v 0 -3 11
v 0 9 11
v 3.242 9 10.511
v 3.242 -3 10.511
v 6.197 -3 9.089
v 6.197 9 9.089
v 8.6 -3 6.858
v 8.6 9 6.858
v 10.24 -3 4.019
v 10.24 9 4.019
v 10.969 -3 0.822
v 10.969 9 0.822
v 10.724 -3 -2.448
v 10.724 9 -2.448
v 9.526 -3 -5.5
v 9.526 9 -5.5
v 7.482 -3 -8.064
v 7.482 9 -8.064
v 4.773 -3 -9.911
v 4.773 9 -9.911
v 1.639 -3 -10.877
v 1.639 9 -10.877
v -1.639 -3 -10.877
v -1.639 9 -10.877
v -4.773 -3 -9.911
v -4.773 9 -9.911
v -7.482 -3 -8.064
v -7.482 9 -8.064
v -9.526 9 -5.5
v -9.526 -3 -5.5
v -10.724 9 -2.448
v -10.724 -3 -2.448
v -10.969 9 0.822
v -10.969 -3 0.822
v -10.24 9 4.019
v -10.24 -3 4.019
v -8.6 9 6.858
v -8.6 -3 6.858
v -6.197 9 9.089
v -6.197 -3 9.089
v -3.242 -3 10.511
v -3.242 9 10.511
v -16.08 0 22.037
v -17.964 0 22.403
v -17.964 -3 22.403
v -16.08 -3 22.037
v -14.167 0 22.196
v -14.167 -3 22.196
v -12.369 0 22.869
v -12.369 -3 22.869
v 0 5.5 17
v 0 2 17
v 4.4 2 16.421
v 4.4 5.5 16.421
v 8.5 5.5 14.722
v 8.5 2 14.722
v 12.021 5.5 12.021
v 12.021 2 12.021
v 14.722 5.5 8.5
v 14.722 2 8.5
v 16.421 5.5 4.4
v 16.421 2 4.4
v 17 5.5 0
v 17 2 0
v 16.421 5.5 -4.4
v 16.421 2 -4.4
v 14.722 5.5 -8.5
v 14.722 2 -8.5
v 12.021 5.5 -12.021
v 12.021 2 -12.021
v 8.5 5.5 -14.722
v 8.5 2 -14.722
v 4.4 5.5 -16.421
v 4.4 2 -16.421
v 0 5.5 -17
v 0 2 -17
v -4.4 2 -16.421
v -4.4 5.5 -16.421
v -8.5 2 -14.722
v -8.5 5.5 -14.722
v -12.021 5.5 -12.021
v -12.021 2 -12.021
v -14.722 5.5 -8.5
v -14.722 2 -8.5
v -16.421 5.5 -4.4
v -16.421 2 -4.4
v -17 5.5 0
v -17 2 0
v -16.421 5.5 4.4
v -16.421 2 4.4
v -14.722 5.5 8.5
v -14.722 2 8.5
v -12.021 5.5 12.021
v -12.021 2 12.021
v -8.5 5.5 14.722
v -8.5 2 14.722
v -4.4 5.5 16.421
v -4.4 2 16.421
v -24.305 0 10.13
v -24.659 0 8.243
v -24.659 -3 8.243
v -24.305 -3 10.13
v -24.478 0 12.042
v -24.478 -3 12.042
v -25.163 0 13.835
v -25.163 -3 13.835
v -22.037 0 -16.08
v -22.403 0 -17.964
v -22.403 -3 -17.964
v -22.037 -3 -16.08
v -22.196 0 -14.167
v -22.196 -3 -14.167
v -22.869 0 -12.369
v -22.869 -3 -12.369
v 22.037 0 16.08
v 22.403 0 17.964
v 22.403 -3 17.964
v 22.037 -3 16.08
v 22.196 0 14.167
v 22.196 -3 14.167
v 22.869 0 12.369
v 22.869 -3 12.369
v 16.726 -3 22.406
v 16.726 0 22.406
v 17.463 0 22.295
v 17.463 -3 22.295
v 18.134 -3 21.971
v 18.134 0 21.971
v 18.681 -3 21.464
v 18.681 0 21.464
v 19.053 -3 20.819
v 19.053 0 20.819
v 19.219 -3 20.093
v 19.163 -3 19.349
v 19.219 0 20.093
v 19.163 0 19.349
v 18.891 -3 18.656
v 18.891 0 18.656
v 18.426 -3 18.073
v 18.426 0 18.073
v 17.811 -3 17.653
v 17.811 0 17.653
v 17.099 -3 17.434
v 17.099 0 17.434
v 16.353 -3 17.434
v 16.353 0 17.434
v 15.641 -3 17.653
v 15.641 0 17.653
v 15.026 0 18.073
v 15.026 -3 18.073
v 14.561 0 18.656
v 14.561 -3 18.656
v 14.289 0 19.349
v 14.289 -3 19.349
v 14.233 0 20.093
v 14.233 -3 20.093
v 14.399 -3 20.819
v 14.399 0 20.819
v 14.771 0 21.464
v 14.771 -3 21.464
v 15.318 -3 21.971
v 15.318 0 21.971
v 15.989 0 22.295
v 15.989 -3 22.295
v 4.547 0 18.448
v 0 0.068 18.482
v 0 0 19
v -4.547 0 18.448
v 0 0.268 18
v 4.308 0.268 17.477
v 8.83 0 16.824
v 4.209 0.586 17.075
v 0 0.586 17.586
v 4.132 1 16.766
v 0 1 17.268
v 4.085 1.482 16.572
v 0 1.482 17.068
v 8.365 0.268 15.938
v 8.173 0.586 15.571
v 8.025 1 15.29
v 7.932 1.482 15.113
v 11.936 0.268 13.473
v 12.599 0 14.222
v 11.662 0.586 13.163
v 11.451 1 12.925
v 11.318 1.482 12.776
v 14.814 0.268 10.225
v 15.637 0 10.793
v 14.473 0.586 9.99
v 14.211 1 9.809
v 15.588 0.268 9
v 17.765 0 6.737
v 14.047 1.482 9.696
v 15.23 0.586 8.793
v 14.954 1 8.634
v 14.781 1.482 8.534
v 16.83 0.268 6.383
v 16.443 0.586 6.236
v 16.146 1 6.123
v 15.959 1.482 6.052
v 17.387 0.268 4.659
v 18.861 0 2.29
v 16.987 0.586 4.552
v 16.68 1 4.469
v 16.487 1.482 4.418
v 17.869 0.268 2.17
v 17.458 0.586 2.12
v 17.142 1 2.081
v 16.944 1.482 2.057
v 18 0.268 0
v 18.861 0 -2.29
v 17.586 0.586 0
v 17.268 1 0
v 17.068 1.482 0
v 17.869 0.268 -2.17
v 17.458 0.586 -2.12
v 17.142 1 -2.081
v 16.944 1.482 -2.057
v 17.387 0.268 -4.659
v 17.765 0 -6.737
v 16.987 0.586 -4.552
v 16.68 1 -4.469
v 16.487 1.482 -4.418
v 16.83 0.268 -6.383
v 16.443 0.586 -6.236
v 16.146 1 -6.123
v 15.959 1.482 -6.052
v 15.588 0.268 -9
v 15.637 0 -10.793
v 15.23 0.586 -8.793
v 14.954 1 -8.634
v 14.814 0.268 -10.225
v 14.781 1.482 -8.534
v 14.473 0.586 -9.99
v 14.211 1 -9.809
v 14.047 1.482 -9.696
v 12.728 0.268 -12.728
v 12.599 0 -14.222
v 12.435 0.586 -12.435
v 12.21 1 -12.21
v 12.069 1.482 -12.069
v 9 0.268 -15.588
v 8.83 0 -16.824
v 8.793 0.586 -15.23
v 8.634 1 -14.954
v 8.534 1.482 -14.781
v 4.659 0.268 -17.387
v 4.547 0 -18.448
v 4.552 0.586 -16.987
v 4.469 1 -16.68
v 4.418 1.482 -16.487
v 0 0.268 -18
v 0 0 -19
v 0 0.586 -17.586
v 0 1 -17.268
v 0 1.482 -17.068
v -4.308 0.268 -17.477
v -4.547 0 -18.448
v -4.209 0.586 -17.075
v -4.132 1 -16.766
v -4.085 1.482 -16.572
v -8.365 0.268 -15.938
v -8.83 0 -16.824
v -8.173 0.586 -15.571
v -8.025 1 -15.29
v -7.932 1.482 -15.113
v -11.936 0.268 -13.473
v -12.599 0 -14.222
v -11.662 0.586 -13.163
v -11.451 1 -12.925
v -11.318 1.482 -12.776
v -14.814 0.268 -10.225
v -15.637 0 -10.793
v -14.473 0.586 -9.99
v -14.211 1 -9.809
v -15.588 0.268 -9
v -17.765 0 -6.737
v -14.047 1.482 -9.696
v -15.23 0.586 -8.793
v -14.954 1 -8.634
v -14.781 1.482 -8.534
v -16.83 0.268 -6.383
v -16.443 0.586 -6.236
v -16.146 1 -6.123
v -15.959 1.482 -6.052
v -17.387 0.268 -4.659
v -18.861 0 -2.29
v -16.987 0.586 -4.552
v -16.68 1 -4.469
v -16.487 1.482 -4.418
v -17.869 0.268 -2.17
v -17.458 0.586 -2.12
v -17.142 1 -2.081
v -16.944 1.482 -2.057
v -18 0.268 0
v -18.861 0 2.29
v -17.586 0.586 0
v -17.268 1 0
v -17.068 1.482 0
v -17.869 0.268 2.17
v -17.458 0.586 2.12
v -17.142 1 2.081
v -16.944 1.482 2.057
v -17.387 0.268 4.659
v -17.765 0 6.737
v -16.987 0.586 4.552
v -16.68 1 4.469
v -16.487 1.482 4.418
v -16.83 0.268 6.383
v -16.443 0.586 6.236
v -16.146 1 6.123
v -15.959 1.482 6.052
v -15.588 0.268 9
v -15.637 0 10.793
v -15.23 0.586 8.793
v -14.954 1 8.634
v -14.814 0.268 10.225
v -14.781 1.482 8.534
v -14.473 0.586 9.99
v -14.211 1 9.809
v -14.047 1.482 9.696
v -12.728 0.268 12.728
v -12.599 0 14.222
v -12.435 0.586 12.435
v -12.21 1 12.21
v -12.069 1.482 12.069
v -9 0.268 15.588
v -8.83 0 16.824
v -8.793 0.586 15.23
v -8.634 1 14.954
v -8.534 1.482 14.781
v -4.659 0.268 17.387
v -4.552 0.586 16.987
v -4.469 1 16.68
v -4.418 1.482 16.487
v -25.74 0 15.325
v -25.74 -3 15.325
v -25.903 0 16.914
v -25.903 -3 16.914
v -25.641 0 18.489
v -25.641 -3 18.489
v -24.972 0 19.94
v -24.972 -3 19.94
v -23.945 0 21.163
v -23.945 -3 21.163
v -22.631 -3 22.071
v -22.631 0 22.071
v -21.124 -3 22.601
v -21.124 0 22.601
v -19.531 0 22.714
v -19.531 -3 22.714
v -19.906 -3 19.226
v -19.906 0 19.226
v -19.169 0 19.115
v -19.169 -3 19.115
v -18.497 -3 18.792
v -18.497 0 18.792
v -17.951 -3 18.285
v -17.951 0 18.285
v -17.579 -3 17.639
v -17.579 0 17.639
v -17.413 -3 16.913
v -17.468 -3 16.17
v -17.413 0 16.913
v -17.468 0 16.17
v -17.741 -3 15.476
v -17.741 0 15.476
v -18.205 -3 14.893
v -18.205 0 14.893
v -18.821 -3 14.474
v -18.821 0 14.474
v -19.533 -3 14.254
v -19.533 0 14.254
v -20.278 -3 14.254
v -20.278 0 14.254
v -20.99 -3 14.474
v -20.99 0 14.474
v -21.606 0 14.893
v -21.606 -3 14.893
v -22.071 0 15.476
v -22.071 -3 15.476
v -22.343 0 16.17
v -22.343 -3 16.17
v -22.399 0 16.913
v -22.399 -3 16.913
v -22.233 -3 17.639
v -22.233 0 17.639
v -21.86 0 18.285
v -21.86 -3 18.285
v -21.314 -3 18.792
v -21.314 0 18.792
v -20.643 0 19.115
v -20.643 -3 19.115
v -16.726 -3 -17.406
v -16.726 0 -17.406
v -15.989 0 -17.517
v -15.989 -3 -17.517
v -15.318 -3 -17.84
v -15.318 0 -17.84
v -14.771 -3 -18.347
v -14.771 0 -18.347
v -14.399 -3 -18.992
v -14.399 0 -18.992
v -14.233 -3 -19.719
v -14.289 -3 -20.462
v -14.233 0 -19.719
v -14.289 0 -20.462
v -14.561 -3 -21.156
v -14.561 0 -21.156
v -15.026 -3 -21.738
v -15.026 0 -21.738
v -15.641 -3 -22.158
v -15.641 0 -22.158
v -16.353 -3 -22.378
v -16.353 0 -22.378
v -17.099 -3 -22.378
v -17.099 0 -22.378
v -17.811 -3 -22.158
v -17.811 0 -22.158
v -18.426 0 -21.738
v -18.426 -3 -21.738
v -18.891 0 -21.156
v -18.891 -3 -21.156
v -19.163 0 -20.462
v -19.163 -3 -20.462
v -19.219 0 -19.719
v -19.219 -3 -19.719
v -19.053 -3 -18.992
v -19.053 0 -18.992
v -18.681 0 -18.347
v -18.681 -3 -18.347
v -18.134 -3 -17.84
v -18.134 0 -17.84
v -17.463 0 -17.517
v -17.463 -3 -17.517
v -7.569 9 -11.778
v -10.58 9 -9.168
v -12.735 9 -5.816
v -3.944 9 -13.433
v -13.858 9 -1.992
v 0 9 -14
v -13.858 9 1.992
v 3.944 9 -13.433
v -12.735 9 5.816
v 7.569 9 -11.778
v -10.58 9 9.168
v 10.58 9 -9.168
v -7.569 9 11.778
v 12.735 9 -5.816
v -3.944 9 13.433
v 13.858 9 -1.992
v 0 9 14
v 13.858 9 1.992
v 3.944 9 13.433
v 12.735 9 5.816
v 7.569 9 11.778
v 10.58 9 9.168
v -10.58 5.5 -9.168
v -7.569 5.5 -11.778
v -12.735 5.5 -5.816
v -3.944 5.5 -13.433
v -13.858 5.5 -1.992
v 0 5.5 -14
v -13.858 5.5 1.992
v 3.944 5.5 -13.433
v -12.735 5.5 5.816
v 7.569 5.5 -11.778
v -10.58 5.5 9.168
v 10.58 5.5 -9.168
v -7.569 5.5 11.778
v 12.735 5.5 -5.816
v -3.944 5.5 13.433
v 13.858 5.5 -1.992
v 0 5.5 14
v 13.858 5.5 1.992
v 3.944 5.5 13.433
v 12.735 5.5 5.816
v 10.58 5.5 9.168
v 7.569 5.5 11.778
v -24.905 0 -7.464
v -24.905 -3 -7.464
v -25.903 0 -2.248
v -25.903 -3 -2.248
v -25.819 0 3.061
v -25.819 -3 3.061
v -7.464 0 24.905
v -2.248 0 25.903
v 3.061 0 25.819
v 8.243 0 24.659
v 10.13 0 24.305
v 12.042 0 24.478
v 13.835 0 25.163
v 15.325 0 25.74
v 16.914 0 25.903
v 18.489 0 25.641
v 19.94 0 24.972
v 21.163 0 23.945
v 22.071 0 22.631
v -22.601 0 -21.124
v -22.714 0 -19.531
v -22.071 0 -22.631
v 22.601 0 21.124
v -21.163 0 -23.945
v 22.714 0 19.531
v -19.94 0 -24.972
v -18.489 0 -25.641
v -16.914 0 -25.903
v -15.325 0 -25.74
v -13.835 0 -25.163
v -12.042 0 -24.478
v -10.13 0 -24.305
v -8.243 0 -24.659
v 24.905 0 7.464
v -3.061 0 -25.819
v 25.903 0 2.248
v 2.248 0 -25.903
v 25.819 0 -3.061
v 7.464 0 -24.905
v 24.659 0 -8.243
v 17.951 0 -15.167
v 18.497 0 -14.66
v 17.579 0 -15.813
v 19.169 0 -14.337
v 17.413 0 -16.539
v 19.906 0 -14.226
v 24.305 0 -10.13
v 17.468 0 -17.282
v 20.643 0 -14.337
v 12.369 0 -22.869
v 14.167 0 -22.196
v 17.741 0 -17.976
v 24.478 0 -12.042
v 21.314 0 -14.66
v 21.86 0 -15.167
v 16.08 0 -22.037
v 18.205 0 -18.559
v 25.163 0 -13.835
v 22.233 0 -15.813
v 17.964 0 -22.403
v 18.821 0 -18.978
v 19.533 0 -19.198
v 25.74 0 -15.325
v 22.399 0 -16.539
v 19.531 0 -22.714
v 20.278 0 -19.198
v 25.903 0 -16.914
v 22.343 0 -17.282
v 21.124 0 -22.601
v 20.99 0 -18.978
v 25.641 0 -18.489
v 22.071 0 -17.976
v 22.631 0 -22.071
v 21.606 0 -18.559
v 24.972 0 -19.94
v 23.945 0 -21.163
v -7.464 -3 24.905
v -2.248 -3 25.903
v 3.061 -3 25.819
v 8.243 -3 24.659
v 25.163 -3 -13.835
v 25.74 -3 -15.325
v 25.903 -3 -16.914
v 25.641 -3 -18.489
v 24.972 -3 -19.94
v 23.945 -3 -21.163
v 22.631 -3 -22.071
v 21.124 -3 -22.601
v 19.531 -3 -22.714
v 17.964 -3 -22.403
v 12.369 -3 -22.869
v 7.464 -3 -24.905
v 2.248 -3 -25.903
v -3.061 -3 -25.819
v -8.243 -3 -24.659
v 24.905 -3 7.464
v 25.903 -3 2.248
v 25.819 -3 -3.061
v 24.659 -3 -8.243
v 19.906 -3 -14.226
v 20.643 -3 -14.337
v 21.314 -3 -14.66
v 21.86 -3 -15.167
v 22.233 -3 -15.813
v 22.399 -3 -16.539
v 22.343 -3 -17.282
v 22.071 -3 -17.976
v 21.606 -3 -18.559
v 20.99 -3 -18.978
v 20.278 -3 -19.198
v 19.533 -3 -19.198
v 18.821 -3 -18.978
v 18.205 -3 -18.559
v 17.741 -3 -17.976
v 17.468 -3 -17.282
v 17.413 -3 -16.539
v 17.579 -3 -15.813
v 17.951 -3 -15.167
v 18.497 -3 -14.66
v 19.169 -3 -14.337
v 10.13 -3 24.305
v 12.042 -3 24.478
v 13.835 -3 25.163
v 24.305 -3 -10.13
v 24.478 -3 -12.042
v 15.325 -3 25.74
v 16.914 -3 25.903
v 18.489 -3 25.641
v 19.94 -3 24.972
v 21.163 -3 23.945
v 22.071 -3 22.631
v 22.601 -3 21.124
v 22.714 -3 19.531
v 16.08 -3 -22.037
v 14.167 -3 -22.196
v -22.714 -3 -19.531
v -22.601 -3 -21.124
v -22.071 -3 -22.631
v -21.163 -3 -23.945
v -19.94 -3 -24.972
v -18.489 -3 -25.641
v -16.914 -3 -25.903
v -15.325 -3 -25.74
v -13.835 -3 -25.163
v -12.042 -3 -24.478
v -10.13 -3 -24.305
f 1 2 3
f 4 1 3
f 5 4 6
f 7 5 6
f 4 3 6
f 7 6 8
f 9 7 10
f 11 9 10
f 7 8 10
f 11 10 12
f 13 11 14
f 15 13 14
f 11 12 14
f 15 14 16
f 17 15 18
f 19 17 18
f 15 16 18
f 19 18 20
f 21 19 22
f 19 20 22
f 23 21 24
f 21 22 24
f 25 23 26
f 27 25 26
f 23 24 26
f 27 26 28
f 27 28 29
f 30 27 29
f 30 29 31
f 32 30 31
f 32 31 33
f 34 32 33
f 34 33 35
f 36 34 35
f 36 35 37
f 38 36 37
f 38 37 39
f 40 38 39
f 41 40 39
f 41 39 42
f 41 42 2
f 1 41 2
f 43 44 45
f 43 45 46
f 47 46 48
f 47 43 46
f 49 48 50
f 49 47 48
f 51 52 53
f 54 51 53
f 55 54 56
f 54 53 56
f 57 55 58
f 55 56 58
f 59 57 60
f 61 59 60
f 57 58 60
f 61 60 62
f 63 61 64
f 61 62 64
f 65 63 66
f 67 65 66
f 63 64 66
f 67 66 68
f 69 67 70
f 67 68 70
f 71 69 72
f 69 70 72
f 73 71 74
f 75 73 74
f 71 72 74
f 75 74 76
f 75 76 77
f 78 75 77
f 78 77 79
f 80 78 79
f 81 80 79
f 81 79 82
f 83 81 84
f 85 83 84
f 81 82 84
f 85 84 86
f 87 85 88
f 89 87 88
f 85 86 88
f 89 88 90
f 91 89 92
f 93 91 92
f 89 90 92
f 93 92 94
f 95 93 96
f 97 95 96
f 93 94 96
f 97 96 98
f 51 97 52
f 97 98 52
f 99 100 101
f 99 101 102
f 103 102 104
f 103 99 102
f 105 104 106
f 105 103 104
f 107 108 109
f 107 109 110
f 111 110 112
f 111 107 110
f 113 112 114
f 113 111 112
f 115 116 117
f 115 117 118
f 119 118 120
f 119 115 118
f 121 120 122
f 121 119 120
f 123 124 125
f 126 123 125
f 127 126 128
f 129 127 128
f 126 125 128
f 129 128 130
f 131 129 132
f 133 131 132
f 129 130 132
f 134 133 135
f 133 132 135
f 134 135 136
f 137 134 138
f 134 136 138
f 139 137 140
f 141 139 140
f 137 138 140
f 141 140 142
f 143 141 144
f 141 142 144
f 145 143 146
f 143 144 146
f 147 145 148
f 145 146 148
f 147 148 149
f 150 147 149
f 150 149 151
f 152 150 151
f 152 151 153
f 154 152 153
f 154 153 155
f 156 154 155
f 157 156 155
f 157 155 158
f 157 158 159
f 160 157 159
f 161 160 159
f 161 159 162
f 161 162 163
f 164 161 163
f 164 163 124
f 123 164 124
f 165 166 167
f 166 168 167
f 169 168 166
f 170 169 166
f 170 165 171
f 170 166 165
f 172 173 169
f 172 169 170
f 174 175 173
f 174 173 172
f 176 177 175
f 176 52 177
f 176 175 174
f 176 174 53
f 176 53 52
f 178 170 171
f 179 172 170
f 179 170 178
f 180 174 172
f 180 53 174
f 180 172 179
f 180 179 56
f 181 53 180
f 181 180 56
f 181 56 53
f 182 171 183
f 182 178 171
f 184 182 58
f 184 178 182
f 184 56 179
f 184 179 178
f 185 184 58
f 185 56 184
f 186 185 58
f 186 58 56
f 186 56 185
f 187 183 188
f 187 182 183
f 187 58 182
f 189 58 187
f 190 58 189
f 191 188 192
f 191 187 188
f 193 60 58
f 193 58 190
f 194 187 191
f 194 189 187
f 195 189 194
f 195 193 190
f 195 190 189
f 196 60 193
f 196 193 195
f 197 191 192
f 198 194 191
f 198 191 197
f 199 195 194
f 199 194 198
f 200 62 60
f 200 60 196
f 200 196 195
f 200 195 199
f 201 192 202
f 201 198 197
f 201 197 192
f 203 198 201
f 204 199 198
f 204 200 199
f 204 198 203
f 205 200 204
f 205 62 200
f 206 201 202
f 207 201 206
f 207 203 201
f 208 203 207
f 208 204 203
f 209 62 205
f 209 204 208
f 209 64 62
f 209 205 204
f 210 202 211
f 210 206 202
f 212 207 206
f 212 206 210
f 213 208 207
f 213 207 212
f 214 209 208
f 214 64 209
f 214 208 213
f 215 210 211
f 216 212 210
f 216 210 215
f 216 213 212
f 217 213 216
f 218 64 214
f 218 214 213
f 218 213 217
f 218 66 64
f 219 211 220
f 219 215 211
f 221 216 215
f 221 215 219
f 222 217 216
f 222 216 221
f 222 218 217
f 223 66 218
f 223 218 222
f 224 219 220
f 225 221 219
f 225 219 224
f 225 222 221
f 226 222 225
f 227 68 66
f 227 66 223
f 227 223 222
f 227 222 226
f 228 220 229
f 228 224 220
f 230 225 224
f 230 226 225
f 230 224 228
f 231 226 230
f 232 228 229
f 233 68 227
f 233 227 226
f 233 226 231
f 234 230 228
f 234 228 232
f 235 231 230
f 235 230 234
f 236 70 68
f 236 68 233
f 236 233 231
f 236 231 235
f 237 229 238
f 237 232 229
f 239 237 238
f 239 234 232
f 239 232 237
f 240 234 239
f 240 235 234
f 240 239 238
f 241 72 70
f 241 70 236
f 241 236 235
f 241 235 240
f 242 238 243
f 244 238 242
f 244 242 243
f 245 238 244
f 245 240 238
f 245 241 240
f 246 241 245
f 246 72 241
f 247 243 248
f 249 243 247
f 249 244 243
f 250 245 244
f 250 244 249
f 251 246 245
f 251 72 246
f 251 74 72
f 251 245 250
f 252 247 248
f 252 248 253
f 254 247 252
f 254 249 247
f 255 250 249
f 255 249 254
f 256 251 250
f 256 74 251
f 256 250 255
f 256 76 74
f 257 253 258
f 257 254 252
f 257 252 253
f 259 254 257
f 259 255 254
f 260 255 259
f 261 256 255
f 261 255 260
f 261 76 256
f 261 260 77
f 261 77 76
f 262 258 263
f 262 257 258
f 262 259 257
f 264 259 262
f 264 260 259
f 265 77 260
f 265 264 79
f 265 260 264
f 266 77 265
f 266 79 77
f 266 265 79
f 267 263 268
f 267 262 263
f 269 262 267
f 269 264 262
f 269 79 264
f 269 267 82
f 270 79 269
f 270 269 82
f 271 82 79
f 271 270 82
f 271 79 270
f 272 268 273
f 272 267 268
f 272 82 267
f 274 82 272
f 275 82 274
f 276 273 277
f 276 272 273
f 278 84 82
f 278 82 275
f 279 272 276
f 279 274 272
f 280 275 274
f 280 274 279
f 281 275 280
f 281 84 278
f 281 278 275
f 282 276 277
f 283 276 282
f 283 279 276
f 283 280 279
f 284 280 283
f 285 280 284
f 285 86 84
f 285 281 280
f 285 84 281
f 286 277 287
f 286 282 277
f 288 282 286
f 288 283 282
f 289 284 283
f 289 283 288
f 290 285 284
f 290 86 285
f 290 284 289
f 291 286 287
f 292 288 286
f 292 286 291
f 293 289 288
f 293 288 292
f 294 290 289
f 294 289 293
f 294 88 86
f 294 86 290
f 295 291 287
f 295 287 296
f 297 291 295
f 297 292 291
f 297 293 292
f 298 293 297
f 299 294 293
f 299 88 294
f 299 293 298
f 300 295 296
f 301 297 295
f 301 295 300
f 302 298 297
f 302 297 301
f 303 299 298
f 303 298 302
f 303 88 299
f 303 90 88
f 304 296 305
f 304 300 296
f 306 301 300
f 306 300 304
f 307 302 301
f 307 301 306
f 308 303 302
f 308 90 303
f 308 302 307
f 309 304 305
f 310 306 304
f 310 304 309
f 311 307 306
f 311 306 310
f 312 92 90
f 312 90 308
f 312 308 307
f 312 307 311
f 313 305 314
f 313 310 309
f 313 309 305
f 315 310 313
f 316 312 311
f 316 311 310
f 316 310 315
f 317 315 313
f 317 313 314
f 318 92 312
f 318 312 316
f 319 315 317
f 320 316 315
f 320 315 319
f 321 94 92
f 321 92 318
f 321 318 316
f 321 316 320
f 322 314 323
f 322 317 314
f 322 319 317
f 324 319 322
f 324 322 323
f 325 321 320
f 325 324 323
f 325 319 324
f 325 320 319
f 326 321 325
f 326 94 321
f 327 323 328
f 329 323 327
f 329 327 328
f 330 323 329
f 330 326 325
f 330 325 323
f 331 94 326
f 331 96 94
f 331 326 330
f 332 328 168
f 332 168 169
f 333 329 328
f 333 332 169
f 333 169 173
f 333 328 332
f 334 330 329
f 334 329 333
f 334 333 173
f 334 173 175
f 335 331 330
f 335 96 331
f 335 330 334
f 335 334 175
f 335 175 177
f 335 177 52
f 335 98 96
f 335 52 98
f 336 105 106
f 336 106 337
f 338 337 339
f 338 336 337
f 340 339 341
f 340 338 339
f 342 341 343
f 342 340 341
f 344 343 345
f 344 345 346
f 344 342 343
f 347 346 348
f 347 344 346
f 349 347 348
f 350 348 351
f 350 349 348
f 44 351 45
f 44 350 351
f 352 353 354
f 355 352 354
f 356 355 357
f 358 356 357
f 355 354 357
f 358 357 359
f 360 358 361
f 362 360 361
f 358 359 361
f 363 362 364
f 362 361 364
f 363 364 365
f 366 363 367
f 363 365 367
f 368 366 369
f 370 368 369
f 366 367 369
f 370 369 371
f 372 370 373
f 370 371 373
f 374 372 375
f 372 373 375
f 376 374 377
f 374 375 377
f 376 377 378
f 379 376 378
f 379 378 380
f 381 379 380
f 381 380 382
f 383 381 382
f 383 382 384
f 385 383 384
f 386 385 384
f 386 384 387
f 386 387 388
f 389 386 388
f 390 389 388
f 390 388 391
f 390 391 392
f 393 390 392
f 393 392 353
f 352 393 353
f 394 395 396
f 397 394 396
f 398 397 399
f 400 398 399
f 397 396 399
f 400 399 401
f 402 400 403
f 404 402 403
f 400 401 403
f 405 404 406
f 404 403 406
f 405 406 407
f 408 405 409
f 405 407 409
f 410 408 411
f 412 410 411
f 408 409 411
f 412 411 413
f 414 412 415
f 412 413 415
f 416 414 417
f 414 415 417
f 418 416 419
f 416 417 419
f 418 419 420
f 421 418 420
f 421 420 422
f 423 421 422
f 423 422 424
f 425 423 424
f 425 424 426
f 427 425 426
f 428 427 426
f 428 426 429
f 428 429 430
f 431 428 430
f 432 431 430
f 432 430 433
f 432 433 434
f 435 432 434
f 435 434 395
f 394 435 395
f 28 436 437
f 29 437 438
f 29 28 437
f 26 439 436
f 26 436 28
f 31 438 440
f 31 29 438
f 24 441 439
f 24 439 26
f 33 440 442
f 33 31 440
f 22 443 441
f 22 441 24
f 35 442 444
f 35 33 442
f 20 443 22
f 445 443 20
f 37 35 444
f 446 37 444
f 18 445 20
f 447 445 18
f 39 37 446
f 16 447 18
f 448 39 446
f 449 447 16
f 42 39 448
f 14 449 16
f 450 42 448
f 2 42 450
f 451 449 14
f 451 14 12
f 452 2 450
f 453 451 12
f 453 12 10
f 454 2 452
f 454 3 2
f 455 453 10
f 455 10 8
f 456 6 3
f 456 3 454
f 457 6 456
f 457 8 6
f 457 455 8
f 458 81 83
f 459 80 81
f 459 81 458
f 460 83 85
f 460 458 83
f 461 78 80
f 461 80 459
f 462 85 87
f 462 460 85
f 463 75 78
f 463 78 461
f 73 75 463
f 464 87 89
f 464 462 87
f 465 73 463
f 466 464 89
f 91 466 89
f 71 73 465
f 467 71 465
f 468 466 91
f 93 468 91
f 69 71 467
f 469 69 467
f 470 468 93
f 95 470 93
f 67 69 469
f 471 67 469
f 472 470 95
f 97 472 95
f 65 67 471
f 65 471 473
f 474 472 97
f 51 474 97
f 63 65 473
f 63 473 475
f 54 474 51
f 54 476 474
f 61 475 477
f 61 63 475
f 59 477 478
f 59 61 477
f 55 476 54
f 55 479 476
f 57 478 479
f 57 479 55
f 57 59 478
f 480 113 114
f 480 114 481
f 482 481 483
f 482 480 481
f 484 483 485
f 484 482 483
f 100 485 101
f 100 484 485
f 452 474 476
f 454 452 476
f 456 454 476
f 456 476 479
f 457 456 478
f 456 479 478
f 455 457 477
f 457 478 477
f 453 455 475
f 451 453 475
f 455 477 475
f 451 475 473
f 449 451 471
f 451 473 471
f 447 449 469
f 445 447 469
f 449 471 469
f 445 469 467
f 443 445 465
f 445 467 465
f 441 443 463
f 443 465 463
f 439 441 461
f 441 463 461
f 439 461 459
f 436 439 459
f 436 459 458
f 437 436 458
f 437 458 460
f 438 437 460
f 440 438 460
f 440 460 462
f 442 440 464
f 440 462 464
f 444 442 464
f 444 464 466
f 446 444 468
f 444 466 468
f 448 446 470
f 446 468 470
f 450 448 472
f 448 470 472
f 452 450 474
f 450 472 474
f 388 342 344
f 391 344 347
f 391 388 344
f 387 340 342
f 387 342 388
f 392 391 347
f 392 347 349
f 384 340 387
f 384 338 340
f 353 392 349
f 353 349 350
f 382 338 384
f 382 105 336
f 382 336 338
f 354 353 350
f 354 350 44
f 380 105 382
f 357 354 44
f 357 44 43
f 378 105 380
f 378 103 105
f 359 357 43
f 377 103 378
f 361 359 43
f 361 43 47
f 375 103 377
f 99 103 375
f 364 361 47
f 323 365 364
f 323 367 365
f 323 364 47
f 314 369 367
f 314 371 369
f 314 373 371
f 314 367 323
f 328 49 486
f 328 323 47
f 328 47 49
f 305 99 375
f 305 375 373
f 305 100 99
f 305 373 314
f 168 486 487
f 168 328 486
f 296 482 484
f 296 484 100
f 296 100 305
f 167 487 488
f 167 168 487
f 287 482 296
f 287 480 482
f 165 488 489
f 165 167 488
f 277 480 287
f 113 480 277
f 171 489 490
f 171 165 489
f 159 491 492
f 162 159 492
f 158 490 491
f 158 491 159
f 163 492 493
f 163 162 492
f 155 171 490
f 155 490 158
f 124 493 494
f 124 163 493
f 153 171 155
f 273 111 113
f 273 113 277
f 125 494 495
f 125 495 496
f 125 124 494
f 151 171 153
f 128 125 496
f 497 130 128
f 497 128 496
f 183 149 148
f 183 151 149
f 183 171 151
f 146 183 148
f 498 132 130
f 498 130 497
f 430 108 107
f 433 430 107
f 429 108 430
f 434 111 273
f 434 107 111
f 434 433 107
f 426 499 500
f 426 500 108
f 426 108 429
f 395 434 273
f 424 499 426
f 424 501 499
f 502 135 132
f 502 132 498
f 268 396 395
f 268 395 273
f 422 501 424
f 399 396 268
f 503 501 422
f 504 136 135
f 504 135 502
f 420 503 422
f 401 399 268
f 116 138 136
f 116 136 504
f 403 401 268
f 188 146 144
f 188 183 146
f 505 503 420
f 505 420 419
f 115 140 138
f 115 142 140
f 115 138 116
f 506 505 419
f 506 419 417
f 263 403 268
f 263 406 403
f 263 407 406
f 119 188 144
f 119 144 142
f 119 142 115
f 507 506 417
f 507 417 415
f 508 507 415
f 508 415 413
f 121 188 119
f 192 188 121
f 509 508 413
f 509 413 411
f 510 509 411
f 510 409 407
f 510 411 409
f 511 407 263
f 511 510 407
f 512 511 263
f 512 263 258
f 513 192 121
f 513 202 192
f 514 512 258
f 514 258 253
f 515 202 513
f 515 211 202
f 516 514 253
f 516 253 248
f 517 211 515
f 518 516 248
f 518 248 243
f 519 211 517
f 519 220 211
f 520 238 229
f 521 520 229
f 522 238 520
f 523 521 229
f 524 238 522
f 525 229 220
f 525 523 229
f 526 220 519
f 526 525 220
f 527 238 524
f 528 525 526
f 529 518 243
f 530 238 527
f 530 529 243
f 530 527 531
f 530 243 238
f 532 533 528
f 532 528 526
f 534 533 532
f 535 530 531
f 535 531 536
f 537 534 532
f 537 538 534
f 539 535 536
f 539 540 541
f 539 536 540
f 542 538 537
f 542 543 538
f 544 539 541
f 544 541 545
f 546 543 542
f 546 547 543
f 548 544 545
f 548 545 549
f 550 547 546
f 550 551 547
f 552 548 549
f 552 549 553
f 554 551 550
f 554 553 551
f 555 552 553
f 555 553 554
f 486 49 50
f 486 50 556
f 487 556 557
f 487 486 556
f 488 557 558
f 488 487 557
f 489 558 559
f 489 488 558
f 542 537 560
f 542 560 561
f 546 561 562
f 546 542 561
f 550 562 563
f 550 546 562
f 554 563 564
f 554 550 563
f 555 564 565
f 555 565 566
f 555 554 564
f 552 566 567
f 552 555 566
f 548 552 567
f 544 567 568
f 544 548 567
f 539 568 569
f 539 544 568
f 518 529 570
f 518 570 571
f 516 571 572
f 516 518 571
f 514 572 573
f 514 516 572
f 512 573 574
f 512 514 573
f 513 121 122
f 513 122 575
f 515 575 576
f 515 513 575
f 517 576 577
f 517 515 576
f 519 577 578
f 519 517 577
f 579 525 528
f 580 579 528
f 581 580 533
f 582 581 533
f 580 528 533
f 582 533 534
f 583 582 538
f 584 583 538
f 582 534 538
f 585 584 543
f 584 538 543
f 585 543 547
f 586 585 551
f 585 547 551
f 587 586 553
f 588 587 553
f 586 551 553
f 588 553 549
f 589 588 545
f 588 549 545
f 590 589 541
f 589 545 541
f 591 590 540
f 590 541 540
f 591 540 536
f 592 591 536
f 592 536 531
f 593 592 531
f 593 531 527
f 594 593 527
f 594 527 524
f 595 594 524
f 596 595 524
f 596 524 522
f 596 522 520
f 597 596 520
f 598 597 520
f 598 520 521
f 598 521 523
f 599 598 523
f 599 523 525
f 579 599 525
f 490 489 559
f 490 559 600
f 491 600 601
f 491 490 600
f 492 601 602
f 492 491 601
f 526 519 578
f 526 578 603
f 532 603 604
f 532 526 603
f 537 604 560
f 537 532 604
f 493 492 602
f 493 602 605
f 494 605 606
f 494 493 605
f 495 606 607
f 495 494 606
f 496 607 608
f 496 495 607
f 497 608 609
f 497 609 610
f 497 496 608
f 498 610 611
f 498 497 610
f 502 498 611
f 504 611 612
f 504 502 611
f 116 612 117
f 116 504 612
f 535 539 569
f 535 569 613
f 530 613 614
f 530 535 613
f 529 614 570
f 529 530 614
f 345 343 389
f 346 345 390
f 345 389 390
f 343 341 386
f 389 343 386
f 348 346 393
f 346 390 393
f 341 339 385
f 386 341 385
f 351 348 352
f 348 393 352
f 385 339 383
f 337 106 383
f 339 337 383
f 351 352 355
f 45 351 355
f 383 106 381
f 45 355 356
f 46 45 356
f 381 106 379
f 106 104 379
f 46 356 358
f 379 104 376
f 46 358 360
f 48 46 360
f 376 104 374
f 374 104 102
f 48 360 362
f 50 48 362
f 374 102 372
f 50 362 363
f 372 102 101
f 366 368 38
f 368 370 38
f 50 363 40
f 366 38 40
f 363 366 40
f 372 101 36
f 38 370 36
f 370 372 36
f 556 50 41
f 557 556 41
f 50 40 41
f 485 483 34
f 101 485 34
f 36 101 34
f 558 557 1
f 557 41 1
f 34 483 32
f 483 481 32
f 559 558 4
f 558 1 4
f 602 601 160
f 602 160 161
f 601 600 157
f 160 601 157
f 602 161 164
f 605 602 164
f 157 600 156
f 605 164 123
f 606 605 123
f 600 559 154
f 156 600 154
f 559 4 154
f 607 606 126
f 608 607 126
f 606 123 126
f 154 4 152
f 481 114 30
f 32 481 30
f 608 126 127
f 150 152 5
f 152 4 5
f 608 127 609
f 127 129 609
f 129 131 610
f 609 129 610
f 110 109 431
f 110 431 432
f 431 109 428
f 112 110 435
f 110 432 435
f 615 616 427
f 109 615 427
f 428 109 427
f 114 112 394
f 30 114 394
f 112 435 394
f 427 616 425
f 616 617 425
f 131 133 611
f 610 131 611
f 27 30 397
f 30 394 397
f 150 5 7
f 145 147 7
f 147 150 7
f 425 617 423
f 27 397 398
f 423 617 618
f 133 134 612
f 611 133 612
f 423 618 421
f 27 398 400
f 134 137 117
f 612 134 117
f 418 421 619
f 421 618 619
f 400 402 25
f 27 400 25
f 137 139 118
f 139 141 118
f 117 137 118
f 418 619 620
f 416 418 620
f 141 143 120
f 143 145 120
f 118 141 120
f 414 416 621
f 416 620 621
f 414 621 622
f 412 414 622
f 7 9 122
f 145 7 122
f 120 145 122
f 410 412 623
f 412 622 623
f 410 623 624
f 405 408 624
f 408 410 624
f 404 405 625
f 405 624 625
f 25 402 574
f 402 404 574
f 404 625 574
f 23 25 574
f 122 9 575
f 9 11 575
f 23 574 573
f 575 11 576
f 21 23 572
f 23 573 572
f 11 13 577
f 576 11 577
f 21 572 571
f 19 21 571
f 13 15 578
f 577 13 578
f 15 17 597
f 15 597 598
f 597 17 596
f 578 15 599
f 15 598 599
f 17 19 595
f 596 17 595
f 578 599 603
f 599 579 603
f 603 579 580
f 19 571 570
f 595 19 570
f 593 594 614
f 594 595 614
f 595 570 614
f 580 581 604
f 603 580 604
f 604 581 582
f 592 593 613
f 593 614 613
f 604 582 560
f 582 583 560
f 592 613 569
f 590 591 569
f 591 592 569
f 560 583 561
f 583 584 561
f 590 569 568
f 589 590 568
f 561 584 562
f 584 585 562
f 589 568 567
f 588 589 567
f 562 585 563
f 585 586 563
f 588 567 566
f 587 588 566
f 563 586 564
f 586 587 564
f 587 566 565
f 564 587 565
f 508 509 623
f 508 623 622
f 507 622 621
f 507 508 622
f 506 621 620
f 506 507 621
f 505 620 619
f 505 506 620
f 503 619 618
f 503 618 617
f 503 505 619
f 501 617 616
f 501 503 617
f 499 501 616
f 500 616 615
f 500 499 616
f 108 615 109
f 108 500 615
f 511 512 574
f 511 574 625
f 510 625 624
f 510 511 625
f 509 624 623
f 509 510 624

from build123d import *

# Parameters (mm, degrees)
BOSS_EXTRUDE1_DEPTH = 3
SKETCH2_R           = 17
BOSS_EXTRUDE2_DEPTH = 5.5
SKETCH5_R           = 14
BOSS_EXTRUDE3_DEPTH = 3.5
SKETCH6_R           = 11
CUT_EXTRUDE1_DEPTH  = 44.5
SKETCH7_R           = 2.5
CUT_EXTRUDE2_DEPTH  = 44.5
SKETCH8_R           = 2.5
CUT_EXTRUDE3_DEPTH  = 44.5
SKETCH9_R           = 2.5
CUT_EXTRUDE4_DEPTH  = 44.5
SKETCH10_R          = 2.5
CUT_EXTRUDE5_DEPTH  = 44.5
FILLET23_R          = 2


with BuildPart() as part:
    # Sketch1 → Boss-Extrude1 (new body)
    with BuildSketch(Plane(origin=(0, 0, 0), x_dir=(1, 0, 0), z_dir=(0, 1, 0))):
        with BuildLine():
            ThreePointArc((-12.368882592, -22.86942814), (-2.248386141, -25.902601409), (8.243375366, -24.65860423))
            ThreePointArc((8.243375366, -24.65860423), (11.092172188, -24.325815059), (13.835297391, -25.163464204))
            ThreePointArc((13.835297391, -25.163464204), (20.585915101, -24.499389777), (22.403221797, -17.964159812))
            ThreePointArc((22.403221797, -17.964159812), (22.050754674, -15.117730664), (22.86942814, -12.368882592))
            ThreePointArc((22.86942814, -12.368882592), (25.902601409, -2.248386141), (24.65860423, 8.243375366))
            ThreePointArc((24.65860423, 8.243375366), (24.325815059, 11.092172188), (25.163464204, 13.835297391))
            ThreePointArc((25.163464204, 13.835297391), (24.499389777, 20.585915101), (17.964159812, 22.403221797))
            ThreePointArc((17.964159812, 22.403221797), (15.117730664, 22.050754674), (12.368882592, 22.86942814))
            ThreePointArc((12.368882592, 22.86942814), (2.248386141, 25.902601409), (-8.243375366, 24.65860423))
            ThreePointArc((-8.243375366, 24.65860423), (-11.092172188, 24.325815059), (-13.835297391, 25.163464204))
            ThreePointArc((-13.835297391, 25.163464204), (-20.585915101, 24.499389777), (-22.403221797, 17.964159812))
            ThreePointArc((-22.403221797, 17.964159812), (-22.050754674, 15.117730664), (-22.86942814, 12.368882592))
            ThreePointArc((-22.86942814, 12.368882592), (-25.902601409, 2.248386141), (-24.65860423, -8.243375366))
            ThreePointArc((-24.65860423, -8.243375366), (-24.325815059, -11.092172188), (-25.163464204, -13.835297391))
            ThreePointArc((-25.163464204, -13.835297391), (-24.499389777, -20.585915101), (-17.964159812, -22.403221797))
            ThreePointArc((-17.964159812, -22.403221797), (-15.117730664, -22.050754674), (-12.368882592, -22.86942814))
        make_face()
    extrude(amount=-BOSS_EXTRUDE1_DEPTH)

    # Sketch2 → Boss-Extrude2 (add)
    with BuildSketch(Plane(origin=(0, 0, 0), x_dir=(1, 0, 0), z_dir=(0, 1, 0))):
        with Locations(Location((0, 0, 0), (0, 0, 270))):
            Circle(SKETCH2_R)
    extrude(amount=BOSS_EXTRUDE2_DEPTH)

    # Sketch5 → Boss-Extrude3 (add)
    with BuildSketch(Plane(origin=(0, 5.5, 0), x_dir=(1, 0, 0), z_dir=(0, 1, 0))):
        with Locations(Location((0, 0, 0), (0, 0, 270))):
            Circle(SKETCH5_R)
    extrude(amount=BOSS_EXTRUDE3_DEPTH)

    # Sketch6 → Cut-Extrude1 (cut)
    with BuildSketch(Plane(origin=(0, 9, 0), x_dir=(1, 0, 0), z_dir=(0, 1, 0))):
        with Locations(Location((0, 0, 0), (0, 0, 270))):
            Circle(SKETCH6_R)
    extrude(amount=-CUT_EXTRUDE1_DEPTH, mode=Mode.SUBTRACT)

    # Sketch7 → Cut-Extrude2 (cut)
    with BuildSketch(Plane(origin=(0, 0, 0), x_dir=(1, 0, 0), z_dir=(0, 1, 0))):
        with Locations(Location((-16.72605602, 19.905754194, 0), (0, 0, 270))):
            Circle(SKETCH7_R)
    extrude(amount=-CUT_EXTRUDE2_DEPTH, mode=Mode.SUBTRACT)

    # Sketch8 → Cut-Extrude3 (cut)
    with BuildSketch(Plane(origin=(0, 0, 0), x_dir=(1, 0, 0), z_dir=(0, 1, 0))):
        with Locations(Location((16.72605602, -19.905754194, 0), (0, 0, 270))):
            Circle(SKETCH8_R)
    extrude(amount=-CUT_EXTRUDE3_DEPTH, mode=Mode.SUBTRACT)

    # Sketch9 → Cut-Extrude4 (cut)
    with BuildSketch(Plane(origin=(0, 0, 0), x_dir=(1, 0, 0), z_dir=(0, 1, 0))):
        with Locations(Location((-19.905754194, -16.72605602, 0), (0, 0, 270))):
            Circle(SKETCH9_R)
    extrude(amount=-CUT_EXTRUDE4_DEPTH, mode=Mode.SUBTRACT)

    # Sketch10 → Cut-Extrude5 (cut)
    with BuildSketch(Plane(origin=(0, 0, 0), x_dir=(1, 0, 0), z_dir=(0, 1, 0))):
        with Locations(Location((19.905754194, 16.72605602, 0), (0, 0, 270))):
            Circle(SKETCH10_R)
    extrude(amount=-CUT_EXTRUDE5_DEPTH, mode=Mode.SUBTRACT)

    # Fillet23
    fillet23_edges = [part.edges().sort_by_distance(p)[0] for p in [
        (0, 0, -17),
    ]]
    fillet(fillet23_edges, radius=FILLET23_R)


solid = part.part
